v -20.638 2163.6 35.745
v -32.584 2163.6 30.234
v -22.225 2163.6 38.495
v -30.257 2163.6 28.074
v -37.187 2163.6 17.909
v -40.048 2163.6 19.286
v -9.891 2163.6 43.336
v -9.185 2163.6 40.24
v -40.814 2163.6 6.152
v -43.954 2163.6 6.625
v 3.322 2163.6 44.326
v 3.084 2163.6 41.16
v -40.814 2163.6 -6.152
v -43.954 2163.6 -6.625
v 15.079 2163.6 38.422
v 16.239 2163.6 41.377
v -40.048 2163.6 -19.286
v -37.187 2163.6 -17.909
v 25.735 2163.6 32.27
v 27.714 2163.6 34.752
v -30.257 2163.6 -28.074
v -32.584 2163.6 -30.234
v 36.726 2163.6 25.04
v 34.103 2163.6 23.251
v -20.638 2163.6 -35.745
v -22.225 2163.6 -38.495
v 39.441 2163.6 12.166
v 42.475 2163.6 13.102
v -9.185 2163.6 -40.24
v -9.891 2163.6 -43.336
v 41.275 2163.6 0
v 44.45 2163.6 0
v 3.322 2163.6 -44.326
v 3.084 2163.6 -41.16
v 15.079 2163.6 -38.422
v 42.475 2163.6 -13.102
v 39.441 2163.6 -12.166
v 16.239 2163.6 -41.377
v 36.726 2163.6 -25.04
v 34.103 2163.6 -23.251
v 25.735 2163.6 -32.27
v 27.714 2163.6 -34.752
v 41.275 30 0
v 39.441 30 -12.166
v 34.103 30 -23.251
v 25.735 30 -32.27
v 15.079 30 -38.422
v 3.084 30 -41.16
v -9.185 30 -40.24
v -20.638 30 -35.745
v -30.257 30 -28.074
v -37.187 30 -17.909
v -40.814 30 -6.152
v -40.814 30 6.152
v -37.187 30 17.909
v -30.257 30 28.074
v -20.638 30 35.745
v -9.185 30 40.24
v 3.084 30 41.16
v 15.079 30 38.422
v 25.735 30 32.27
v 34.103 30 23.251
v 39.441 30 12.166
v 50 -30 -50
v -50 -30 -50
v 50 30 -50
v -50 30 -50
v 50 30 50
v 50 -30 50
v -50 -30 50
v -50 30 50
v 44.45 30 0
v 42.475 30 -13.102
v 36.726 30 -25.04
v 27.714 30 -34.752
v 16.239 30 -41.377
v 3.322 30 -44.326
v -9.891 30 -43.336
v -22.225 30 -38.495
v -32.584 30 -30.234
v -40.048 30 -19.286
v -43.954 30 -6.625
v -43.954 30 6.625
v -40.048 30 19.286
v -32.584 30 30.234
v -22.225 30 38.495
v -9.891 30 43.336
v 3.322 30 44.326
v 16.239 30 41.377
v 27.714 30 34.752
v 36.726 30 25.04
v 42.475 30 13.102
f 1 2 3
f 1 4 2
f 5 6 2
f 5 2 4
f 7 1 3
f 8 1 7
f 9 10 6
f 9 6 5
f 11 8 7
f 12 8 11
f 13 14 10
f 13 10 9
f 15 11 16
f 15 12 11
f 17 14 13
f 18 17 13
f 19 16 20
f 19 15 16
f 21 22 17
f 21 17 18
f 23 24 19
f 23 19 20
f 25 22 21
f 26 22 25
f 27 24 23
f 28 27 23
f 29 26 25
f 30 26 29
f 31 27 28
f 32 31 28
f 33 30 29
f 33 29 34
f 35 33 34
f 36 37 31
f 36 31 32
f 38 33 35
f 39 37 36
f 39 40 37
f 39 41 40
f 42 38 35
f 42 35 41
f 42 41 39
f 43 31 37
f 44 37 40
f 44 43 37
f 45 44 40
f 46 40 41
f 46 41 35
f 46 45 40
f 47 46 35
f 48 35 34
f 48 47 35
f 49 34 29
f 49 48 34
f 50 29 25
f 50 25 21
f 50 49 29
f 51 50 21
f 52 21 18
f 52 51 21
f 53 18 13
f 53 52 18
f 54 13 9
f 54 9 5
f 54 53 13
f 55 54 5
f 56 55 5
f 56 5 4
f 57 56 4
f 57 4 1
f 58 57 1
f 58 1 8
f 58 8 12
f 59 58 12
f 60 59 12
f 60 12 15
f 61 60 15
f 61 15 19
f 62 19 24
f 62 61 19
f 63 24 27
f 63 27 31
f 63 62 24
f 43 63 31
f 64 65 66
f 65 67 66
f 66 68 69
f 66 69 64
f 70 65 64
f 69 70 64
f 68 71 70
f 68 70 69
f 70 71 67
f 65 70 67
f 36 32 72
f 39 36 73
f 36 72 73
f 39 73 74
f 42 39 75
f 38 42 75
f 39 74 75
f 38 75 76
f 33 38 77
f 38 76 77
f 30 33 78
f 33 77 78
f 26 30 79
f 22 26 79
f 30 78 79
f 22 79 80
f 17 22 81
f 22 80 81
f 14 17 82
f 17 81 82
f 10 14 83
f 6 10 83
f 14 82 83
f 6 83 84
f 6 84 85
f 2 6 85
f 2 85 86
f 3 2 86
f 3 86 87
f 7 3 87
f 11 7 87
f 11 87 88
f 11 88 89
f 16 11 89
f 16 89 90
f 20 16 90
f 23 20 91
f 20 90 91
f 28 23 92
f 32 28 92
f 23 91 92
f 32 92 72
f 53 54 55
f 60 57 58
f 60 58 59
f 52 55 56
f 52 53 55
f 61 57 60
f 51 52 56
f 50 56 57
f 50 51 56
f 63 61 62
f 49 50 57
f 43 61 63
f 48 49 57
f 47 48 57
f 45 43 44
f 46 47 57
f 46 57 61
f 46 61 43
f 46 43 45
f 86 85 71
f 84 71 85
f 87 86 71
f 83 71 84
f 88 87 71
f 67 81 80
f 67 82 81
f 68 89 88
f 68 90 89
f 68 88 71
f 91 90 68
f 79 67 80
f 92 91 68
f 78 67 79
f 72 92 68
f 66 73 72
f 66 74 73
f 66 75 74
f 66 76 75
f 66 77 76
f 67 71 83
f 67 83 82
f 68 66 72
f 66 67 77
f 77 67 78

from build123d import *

# Parameters (mm, degrees)
SKETCH1_W           = 100
SKETCH1_H           = 100
BOSS_EXTRUDE1_DEPTH = 30
SKETCH2_R           = 44.45
SKETCH2_R_2         = 41.275
BOSS_EXTRUDE2_DEPTH = 2133.6


with BuildPart() as part:
    # Sketch1 → Boss-Extrude1 (new body, symmetric)
    with BuildSketch(Plane(origin=(0, 0, 0), x_dir=(1, 0, 0), z_dir=(0, 1, 0))):
        Rectangle(SKETCH1_W, SKETCH1_H)
    extrude(amount=BOSS_EXTRUDE1_DEPTH, both=True)

    # Sketch2 → Boss-Extrude2 (add)
    with BuildSketch(Plane(origin=(0, 30, 0), x_dir=(1, 0, 0), z_dir=(0, 1, 0))):
        Circle(SKETCH2_R)
        Circle(SKETCH2_R_2, mode=Mode.SUBTRACT)
    extrude(amount=BOSS_EXTRUDE2_DEPTH)


solid = part.part
